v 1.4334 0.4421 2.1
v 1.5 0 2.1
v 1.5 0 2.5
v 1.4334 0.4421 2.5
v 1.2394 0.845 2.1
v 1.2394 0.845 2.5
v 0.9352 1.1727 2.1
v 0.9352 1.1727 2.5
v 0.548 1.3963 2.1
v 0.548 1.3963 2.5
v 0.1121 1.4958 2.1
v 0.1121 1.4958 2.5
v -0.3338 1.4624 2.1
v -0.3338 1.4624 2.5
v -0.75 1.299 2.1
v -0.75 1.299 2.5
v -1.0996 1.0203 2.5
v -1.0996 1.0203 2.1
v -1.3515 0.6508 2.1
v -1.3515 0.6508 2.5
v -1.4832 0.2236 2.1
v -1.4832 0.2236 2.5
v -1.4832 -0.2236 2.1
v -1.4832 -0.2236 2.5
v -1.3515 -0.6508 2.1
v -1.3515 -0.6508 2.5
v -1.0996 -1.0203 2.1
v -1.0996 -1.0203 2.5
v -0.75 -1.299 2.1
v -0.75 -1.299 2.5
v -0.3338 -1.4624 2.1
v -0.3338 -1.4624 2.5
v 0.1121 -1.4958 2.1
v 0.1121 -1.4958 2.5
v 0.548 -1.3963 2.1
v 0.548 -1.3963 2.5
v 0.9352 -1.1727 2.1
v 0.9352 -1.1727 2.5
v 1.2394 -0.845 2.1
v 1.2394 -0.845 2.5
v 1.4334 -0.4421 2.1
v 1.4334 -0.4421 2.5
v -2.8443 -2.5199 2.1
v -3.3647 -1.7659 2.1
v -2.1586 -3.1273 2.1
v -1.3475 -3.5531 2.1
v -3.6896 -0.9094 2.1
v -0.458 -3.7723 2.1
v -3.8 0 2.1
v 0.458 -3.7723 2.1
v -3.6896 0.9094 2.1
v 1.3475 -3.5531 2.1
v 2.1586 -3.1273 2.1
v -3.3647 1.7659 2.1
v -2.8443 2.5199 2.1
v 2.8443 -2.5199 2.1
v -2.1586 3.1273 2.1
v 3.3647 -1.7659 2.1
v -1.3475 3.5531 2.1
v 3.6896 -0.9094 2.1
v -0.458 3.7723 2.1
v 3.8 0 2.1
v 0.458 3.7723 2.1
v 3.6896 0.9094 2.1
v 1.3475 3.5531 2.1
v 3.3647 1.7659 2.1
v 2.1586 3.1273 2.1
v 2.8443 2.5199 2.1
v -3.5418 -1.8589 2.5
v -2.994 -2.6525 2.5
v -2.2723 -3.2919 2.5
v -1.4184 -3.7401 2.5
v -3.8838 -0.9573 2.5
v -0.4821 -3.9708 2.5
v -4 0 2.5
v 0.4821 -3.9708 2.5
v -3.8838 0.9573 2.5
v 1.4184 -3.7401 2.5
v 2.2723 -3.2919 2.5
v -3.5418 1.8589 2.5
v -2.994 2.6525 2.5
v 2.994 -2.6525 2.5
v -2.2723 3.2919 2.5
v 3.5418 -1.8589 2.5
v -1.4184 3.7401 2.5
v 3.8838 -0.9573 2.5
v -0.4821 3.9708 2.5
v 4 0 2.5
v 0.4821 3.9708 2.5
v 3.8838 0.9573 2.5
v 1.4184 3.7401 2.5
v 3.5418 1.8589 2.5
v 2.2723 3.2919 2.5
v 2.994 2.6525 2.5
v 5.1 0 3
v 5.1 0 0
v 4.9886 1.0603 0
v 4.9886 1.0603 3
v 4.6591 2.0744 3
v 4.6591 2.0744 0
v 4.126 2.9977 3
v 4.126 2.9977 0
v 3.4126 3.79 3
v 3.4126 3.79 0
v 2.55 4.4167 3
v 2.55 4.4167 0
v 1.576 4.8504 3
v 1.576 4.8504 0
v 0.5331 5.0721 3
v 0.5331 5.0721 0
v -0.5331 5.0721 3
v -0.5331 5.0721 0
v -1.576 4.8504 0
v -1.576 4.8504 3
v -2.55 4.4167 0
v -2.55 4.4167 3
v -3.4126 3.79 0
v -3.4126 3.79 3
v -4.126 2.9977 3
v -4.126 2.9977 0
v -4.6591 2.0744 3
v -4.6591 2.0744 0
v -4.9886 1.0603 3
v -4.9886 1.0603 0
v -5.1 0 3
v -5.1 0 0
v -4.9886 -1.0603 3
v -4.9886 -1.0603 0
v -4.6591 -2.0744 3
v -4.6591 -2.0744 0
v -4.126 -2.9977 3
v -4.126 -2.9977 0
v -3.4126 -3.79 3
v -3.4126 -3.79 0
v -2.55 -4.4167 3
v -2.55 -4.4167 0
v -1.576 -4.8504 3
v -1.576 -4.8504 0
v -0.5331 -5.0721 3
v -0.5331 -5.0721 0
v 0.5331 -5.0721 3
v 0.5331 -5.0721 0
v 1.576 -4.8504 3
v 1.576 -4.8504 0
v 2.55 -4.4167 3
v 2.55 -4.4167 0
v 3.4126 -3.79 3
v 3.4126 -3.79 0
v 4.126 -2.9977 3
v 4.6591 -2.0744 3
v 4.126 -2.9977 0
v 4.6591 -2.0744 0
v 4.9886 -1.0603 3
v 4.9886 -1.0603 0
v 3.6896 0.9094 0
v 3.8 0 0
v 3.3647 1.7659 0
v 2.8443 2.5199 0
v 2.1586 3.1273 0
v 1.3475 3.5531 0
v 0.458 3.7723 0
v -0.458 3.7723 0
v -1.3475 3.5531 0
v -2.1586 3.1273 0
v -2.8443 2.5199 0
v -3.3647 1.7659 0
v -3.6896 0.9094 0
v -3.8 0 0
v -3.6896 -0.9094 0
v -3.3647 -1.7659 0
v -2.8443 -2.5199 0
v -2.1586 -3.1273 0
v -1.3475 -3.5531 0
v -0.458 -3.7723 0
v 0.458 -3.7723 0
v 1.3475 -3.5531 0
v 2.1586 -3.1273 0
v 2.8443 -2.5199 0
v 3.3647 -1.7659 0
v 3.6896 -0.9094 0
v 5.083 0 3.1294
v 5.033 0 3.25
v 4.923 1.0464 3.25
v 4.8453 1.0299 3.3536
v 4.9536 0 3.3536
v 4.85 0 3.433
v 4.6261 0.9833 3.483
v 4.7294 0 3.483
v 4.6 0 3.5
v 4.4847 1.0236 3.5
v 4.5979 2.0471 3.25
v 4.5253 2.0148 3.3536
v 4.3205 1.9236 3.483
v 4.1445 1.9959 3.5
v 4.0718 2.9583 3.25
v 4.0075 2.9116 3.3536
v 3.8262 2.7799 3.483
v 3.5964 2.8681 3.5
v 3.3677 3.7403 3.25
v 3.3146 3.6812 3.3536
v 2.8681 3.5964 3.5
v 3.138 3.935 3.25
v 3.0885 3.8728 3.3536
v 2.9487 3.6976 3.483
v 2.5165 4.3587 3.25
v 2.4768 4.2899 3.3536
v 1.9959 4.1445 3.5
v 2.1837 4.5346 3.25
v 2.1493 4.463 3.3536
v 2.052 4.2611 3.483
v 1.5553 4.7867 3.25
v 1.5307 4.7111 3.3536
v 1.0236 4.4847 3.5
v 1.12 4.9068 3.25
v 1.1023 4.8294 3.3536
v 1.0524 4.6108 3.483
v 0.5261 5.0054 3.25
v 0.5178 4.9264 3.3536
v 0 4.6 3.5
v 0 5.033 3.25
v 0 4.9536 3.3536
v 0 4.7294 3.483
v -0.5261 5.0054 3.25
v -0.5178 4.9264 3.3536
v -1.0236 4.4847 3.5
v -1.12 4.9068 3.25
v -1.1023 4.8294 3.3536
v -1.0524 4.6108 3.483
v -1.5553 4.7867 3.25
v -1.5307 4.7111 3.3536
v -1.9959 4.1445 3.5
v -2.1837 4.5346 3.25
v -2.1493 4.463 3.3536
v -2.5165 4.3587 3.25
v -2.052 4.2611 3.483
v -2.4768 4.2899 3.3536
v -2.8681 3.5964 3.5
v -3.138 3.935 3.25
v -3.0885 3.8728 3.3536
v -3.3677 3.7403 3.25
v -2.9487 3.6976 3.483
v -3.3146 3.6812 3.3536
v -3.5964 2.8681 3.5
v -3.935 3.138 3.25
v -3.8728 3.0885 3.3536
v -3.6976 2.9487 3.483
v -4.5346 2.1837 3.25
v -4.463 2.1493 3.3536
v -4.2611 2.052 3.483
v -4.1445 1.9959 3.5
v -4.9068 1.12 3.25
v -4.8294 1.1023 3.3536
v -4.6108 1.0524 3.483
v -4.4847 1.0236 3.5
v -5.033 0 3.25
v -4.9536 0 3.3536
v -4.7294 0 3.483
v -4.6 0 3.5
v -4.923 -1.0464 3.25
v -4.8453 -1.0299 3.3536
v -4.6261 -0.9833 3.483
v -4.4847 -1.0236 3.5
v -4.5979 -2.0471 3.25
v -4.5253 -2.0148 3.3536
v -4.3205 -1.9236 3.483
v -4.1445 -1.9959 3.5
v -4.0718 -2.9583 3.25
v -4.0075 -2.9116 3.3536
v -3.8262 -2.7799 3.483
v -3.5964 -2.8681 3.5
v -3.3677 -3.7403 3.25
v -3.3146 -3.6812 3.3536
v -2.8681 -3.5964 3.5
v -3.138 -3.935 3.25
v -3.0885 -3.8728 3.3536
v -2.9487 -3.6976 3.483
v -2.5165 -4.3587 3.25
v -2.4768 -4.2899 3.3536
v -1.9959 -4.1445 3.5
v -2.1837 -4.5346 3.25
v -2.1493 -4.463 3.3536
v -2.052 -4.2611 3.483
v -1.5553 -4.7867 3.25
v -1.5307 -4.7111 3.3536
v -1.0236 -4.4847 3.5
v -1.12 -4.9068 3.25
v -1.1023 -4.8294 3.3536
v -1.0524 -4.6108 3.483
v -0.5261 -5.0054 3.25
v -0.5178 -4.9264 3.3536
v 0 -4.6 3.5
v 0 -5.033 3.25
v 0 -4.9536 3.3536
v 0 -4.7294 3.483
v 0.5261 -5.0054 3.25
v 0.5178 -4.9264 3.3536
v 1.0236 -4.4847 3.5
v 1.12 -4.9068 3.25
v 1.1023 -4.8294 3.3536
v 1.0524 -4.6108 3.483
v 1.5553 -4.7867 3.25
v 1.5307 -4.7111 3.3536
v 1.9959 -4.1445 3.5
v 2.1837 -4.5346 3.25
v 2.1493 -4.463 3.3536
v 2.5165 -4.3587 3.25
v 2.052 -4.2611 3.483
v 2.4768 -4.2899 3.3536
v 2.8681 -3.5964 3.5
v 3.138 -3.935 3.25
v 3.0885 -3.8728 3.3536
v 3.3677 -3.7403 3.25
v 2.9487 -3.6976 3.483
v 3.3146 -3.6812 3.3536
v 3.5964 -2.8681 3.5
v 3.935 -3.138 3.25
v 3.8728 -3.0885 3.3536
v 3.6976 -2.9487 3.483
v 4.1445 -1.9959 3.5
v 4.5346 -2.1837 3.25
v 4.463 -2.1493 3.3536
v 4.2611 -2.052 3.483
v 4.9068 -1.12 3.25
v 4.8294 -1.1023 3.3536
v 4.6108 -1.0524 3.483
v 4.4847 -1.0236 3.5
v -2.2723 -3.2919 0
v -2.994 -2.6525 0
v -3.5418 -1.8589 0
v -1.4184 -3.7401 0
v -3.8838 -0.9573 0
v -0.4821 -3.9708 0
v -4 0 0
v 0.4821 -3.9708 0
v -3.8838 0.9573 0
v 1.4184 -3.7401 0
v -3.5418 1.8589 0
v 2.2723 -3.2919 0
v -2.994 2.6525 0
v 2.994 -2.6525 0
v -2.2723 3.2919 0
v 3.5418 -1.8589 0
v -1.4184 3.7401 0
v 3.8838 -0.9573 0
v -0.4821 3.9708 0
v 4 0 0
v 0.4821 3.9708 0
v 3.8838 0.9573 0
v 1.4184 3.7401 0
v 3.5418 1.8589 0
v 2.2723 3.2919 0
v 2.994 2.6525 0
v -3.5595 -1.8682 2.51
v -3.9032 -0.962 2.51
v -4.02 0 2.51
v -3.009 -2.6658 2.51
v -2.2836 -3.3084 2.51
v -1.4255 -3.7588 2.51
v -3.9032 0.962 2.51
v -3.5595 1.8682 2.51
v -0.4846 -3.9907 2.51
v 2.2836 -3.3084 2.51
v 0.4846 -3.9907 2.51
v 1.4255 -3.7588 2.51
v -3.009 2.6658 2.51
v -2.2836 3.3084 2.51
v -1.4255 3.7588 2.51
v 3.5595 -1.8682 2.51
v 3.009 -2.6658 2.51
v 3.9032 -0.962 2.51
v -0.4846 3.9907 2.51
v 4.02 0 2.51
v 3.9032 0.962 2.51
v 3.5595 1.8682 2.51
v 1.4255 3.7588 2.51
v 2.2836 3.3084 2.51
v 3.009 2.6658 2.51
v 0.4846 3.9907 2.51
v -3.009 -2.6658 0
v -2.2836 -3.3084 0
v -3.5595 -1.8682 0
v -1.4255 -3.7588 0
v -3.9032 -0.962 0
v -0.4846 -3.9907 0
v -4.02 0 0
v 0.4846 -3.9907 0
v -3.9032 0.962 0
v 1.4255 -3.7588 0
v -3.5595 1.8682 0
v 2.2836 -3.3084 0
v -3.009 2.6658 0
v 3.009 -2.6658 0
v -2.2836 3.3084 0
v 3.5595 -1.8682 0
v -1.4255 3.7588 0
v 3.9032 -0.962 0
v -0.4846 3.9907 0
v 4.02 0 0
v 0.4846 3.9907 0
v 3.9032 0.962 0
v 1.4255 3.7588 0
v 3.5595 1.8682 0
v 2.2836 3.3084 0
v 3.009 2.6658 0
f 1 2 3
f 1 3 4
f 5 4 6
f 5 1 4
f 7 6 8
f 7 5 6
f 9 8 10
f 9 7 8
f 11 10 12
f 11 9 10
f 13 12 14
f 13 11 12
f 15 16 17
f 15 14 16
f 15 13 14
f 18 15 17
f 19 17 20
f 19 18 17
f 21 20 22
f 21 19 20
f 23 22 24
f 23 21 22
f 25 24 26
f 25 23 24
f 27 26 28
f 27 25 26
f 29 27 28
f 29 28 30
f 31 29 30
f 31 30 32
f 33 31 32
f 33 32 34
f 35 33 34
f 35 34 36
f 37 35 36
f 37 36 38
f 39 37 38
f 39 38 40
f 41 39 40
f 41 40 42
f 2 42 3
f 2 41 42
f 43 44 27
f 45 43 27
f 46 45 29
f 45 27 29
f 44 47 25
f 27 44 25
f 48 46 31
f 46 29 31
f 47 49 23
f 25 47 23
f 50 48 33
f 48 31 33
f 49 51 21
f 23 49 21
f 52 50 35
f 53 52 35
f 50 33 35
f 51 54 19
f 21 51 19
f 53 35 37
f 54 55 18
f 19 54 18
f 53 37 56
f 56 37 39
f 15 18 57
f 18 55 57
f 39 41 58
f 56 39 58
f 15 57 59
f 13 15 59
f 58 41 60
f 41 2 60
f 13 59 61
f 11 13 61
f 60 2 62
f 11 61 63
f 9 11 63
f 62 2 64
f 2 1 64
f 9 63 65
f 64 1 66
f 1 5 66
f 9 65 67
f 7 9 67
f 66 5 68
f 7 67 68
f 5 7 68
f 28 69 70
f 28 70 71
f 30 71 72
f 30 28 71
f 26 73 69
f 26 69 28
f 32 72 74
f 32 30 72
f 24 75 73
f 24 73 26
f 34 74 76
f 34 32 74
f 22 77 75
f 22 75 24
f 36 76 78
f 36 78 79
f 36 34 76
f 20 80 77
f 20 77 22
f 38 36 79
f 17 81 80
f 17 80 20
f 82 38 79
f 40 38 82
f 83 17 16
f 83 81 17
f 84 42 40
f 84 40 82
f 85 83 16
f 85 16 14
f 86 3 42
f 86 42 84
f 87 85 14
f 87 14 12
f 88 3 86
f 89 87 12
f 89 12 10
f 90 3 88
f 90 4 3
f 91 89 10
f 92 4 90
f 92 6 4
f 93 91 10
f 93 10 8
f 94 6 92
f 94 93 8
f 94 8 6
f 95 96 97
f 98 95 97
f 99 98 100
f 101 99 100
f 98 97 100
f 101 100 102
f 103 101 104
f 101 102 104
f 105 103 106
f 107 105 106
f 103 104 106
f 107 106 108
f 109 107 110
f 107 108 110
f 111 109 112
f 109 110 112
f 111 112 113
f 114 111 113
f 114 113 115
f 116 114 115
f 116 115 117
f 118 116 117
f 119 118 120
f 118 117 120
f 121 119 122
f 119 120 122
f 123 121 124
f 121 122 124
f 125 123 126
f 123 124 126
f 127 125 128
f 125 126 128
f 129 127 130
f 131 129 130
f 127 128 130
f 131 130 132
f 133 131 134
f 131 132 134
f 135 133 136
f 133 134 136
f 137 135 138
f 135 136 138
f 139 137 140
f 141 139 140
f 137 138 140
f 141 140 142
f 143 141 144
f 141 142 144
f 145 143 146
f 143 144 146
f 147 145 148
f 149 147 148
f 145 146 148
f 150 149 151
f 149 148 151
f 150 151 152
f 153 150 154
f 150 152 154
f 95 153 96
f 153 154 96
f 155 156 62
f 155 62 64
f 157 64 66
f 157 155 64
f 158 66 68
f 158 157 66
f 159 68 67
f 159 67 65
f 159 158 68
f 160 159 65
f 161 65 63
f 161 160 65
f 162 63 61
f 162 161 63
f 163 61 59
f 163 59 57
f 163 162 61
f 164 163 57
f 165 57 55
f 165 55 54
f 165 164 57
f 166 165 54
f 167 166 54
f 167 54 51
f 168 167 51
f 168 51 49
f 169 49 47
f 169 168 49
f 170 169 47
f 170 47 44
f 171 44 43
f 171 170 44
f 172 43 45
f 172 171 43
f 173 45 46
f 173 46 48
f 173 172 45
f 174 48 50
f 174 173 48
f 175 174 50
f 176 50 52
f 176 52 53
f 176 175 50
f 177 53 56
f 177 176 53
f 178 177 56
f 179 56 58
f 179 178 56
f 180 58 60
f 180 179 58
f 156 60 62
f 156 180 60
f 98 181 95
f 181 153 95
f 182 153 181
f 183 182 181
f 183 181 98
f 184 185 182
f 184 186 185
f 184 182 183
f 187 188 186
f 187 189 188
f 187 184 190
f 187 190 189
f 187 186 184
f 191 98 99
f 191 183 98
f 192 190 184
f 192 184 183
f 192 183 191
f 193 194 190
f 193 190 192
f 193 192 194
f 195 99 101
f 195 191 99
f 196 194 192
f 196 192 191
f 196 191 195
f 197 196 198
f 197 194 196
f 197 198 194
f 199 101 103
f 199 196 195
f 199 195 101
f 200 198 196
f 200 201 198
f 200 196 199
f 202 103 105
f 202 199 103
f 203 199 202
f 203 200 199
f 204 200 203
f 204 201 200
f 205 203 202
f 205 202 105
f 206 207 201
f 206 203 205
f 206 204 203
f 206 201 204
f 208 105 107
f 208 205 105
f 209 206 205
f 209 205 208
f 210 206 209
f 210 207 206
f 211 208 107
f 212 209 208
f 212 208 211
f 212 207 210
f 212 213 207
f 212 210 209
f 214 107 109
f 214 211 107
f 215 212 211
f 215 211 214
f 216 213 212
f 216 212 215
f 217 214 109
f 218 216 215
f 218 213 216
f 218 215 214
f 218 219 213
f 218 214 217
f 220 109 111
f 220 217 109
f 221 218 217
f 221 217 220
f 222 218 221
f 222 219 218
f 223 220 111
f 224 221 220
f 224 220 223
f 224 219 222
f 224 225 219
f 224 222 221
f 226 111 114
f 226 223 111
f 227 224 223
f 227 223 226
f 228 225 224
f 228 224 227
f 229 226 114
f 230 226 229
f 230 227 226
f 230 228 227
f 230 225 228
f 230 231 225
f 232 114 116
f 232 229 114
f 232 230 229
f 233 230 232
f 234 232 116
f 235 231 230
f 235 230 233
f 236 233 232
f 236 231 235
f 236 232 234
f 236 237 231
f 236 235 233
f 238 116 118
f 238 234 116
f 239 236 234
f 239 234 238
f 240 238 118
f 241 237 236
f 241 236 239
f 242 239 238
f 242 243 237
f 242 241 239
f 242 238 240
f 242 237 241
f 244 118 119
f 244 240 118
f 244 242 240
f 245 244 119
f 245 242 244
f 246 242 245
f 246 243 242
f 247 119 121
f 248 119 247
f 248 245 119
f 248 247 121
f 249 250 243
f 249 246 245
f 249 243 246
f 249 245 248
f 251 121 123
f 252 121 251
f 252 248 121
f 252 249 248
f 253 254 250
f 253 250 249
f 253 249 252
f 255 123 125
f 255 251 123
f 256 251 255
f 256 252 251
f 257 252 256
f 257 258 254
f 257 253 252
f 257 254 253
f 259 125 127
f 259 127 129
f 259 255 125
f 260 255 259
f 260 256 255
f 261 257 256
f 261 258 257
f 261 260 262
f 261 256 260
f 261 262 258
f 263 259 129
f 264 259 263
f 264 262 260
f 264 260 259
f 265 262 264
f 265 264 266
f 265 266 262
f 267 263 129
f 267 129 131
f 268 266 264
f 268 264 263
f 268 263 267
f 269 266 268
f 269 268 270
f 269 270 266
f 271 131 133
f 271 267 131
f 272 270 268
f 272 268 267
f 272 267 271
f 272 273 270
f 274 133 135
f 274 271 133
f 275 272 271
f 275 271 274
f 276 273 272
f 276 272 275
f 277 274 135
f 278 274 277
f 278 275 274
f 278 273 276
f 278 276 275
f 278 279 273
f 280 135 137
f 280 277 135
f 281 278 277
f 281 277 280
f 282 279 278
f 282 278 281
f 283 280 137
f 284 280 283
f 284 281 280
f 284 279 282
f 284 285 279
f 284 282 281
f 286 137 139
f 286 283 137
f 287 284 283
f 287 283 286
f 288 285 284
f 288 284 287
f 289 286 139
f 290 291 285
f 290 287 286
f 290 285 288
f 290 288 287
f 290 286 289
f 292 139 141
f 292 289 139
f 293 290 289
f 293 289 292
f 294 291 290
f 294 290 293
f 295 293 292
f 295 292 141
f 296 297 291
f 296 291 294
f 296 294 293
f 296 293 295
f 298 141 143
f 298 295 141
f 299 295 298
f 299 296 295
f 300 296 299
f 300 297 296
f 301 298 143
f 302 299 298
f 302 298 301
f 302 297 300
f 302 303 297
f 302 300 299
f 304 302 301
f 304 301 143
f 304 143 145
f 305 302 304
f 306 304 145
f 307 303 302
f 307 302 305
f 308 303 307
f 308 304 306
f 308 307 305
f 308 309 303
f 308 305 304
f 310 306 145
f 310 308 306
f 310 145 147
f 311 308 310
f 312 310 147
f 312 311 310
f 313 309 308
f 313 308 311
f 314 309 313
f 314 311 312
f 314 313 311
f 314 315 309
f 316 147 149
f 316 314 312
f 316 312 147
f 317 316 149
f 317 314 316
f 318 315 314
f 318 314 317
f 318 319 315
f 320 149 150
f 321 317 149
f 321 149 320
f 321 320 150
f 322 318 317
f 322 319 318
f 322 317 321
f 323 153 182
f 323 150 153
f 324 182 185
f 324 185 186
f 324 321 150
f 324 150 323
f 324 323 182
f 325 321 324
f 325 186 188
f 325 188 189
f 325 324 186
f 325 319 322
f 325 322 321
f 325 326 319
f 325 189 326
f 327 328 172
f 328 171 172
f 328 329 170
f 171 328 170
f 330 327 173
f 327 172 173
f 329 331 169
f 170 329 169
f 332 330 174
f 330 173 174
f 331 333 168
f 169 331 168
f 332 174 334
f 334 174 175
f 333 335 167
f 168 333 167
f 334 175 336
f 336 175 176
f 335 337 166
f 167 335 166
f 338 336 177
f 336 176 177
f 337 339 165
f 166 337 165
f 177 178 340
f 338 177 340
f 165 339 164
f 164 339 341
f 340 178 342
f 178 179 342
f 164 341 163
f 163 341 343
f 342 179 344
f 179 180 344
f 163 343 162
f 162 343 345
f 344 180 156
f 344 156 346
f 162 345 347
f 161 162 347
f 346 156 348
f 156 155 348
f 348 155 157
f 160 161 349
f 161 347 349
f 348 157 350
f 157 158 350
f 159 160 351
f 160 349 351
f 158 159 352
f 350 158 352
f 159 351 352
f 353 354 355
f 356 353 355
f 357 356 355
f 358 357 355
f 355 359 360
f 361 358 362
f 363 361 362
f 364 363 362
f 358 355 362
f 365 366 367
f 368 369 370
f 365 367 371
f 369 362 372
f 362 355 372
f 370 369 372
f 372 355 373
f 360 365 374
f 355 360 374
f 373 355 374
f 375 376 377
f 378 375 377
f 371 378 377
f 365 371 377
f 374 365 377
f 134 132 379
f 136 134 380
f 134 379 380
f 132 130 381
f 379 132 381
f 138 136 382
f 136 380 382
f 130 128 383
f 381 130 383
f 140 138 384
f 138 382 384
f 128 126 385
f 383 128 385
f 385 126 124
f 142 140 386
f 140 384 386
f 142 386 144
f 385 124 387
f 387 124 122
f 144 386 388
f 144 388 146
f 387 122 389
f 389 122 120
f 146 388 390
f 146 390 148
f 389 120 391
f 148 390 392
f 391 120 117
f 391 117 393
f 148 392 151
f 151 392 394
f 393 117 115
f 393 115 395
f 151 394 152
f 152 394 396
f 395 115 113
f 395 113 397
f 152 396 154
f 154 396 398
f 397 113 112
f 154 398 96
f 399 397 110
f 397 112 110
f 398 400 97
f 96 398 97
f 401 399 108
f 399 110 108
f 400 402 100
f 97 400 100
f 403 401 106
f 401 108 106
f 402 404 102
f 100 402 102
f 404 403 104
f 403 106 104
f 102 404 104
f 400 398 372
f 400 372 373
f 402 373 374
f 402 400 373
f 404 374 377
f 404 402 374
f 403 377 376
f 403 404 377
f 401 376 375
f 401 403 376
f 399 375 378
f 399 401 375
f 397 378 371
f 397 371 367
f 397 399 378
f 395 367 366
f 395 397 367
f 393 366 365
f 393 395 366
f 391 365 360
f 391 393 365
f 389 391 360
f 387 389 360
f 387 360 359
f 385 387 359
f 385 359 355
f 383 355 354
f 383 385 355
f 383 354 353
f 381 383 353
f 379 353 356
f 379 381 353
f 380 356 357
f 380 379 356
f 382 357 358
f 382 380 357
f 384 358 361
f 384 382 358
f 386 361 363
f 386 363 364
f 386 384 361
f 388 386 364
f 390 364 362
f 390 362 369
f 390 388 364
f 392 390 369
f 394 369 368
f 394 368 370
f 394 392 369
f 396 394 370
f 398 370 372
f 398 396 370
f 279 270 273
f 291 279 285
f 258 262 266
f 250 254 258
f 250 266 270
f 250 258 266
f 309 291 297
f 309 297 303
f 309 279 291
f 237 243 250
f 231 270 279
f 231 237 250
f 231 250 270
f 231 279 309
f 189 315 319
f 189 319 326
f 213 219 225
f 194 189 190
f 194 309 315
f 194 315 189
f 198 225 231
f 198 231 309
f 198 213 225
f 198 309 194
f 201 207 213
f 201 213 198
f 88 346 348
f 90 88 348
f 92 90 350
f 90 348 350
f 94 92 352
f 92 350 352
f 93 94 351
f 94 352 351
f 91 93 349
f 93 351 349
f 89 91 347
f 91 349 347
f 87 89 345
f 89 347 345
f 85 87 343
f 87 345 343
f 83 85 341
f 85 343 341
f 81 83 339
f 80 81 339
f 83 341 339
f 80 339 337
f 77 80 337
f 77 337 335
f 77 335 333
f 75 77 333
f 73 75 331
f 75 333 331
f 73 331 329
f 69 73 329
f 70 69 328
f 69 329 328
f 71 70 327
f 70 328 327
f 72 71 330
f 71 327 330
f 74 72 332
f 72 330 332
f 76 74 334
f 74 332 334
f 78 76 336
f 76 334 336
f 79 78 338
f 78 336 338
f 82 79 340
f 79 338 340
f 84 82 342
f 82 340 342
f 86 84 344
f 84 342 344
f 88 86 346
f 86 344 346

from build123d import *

# Parameters (mm, degrees)
CYLINDER001_R     = 4.02
CYLINDER001_DEPTH = 2.51
CYLINDER_R        = 5.1
CYLINDER_DEPTH    = 3.5
FILLET_R          = 0.5
CYLINDER004_R     = 1.5
CYLINDER004_DEPTH = 3
CYLINDER003_R     = 3.8
CYLINDER003_DEPTH = 2.1
CYLINDER002_R     = 4
CYLINDER002_DEPTH = 2.5


with BuildPart() as cylinder001:
    # Cylinder001 → Cylinder001 (new body)
    with BuildSketch(Plane.XY):
        Circle(CYLINDER001_R)
    extrude(amount=CYLINDER001_DEPTH)


with BuildPart() as fillet_body:
    # Cylinder → Cylinder (new body)
    with BuildSketch(Plane.XY):
        Circle(CYLINDER_R)
    extrude(amount=CYLINDER_DEPTH)

    # Cut: cut Cylinder001
    add(cylinder001.part, mode=Mode.SUBTRACT)

    # Fillet
    fillet_edges = [fillet_body.edges().sort_by_distance(p)[0] for p in [
        (-5.1, 0, 3.5),
    ]]
    fillet(fillet_edges, radius=FILLET_R)


with BuildPart() as cylinder004:
    # Cylinder004 → Cylinder004 (new body)
    with BuildSketch(Plane.XY):
        Circle(CYLINDER004_R)
    extrude(amount=CYLINDER004_DEPTH)


with BuildPart() as fusion:
    # Cylinder003 → Cylinder003 (new body)
    with BuildSketch(Plane.XY):
        Circle(CYLINDER003_R)
    extrude(amount=CYLINDER003_DEPTH)

    # Fusion: union Cylinder004
    add(cylinder004.part)


with BuildPart() as cut001:
    # Cylinder002 → Cylinder002 (new body)
    with BuildSketch(Plane.XY):
        Circle(CYLINDER002_R)
    extrude(amount=CYLINDER002_DEPTH)

    # Cut001: cut Fusion
    add(fusion.part, mode=Mode.SUBTRACT)


solid = Compound([fillet_body.part, cut001.part])
